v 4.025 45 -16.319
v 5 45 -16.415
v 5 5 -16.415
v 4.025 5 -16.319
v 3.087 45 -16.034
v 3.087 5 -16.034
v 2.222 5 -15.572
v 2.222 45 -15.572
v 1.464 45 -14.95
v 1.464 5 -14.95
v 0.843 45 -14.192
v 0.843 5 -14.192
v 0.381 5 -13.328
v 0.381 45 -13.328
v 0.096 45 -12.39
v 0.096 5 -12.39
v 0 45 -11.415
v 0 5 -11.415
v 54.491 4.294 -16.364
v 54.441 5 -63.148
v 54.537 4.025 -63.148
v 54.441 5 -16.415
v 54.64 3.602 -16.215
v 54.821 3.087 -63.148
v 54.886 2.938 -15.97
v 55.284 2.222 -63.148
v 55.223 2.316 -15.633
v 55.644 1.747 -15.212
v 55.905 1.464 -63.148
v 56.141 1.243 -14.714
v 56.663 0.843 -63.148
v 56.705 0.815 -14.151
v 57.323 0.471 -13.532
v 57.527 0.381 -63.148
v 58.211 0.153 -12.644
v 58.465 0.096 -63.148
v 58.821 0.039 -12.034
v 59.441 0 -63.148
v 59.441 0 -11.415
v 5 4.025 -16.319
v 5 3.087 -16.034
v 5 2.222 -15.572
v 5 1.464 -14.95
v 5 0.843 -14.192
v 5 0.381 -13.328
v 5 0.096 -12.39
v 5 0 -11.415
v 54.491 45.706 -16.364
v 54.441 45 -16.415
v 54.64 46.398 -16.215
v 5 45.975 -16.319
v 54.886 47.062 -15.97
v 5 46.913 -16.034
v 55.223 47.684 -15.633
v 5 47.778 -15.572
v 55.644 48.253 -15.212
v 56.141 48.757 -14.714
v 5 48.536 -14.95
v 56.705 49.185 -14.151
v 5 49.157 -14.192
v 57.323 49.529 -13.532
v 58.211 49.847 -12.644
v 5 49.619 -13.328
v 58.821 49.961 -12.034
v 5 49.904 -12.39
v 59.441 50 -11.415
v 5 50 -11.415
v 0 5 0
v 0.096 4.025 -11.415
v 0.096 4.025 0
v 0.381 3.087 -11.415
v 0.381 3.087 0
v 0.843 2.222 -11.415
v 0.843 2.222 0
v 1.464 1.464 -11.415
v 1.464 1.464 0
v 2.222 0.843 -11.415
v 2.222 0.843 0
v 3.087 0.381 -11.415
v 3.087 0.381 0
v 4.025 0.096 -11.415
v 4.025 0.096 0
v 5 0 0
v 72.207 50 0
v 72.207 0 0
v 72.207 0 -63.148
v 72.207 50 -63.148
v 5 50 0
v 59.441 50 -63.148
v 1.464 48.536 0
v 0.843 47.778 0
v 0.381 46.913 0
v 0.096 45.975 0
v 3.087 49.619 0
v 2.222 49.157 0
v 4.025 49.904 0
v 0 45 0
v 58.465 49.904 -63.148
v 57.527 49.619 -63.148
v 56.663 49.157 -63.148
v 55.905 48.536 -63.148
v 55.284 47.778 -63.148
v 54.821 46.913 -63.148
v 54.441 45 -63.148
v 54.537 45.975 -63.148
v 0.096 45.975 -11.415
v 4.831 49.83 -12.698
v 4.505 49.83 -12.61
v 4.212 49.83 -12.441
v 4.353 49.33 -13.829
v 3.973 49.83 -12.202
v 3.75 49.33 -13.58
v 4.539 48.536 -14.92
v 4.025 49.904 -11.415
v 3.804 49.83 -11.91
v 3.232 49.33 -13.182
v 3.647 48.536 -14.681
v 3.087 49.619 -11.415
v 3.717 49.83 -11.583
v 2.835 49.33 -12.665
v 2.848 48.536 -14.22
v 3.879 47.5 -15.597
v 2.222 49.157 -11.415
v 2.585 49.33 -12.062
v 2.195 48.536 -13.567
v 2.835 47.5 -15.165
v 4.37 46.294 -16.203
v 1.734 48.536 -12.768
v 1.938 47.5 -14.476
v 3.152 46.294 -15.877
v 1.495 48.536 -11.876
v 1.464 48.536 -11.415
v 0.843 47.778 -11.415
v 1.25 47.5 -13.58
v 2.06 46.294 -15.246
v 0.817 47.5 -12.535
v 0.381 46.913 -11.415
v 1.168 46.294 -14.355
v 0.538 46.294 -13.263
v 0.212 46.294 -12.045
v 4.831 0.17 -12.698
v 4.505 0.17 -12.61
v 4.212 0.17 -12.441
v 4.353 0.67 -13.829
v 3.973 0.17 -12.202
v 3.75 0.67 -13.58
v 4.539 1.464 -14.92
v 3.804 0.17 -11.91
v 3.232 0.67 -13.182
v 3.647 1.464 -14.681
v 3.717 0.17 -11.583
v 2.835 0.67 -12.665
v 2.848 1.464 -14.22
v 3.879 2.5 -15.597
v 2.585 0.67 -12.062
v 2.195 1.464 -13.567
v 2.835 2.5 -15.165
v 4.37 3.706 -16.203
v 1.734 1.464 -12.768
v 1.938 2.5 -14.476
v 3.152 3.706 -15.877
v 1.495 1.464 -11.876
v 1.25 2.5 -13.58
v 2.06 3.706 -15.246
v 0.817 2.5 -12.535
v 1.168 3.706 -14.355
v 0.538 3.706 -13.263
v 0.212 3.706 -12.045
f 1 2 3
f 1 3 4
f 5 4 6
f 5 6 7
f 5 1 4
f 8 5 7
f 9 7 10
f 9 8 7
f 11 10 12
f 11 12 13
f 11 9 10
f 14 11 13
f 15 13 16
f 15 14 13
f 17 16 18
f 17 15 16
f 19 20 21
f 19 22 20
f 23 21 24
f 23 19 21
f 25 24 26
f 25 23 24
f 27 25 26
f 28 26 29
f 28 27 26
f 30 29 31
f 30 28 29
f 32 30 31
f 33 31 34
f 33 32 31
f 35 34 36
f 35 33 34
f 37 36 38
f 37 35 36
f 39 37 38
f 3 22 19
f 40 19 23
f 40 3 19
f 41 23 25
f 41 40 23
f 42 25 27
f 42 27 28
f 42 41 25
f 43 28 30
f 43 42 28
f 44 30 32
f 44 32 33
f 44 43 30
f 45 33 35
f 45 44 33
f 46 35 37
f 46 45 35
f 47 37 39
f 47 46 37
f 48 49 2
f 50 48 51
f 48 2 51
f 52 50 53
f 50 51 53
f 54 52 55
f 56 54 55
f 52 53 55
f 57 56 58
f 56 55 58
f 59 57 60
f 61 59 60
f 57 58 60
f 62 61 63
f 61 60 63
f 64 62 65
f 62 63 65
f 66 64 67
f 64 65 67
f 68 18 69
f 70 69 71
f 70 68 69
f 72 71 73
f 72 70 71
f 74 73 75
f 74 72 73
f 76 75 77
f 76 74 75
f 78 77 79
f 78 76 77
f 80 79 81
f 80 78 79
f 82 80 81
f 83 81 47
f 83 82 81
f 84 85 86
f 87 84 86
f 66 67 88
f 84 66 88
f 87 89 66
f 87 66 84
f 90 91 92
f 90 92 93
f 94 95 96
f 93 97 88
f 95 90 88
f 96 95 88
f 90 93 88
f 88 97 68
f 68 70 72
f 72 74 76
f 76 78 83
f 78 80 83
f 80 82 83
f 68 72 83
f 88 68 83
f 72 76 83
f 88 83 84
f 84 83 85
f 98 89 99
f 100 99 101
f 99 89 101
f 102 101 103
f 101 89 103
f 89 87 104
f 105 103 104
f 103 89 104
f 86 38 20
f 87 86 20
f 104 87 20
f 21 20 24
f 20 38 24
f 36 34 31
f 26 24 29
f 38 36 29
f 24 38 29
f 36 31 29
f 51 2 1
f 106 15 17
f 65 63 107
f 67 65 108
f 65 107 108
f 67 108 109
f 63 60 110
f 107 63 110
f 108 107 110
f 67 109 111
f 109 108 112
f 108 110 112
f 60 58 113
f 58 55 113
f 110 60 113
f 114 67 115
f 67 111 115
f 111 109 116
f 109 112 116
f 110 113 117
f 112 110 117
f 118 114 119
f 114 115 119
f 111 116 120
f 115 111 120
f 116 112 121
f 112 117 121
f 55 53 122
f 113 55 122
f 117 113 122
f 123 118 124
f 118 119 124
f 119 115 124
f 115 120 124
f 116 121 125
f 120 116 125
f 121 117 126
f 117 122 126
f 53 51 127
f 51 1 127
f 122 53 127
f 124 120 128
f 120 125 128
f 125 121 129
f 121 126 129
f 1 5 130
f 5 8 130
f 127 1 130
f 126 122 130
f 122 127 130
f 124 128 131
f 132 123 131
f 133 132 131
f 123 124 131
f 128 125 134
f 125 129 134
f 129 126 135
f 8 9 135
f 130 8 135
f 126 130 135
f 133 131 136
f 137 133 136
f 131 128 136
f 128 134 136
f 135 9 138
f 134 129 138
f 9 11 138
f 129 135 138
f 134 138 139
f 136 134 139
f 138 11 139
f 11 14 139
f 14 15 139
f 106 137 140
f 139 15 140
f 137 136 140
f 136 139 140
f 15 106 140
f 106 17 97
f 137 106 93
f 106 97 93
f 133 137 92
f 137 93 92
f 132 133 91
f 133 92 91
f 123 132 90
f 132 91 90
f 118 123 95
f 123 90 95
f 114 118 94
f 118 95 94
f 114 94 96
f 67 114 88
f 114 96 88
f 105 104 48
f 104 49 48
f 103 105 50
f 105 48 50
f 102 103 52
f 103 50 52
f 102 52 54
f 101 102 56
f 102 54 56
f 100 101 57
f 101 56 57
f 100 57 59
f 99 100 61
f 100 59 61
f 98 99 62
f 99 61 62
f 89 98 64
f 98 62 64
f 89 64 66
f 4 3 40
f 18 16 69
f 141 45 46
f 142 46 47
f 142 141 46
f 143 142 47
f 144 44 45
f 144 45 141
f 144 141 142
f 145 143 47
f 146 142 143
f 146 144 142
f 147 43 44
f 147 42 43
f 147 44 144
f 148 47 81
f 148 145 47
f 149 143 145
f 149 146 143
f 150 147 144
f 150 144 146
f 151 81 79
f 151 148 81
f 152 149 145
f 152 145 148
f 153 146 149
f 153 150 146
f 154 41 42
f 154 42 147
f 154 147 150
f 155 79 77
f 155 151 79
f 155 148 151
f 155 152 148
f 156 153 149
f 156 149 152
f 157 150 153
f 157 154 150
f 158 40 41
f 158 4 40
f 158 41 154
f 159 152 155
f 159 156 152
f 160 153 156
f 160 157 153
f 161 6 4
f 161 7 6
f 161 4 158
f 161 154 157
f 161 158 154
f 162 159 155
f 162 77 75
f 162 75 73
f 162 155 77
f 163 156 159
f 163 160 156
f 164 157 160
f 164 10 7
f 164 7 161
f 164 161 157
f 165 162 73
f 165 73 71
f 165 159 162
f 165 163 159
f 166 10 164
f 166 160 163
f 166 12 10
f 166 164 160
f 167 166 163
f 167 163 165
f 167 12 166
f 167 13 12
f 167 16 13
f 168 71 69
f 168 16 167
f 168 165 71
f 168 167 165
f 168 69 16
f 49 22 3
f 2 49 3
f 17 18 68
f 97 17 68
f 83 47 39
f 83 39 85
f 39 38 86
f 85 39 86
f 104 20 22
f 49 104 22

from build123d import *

# Parameters (mm, degrees)
BOSS_EXTRUDE1_DEPTH = 50
FILLET2_R           = 5


with BuildPart() as part:
    # Sketch1 → Boss-Extrude1 (new body)
    with BuildSketch(Plane(origin=(0, 0, 0), x_dir=(1, 0, 0), z_dir=(0, 1, 0))):
        Polygon((0, 0), (72.207221558, 0), (72.207221558, 63.147853309), (54.440853042, 63.147853309), (54.440853042, 16.414579606), (0, 16.414579606), align=None)
    extrude(amount=BOSS_EXTRUDE1_DEPTH)

    # Fillet2
    fillet2_edges = [part.edges().sort_by_distance(p)[0] for p in [
        (0, 25, -16.414579606),
        (54.440853042, 50, -39.781216458),
        (27.220426521, 50, -16.414579606),
        (0, 50, -8.207289803),
        (27.220426521, 0, -16.414579606),
        (54.440853042, 0, -39.781216458),
        (0, 0, -8.207289803),
    ]]
    fillet(fillet2_edges, radius=FILLET2_R)


solid = part.part
